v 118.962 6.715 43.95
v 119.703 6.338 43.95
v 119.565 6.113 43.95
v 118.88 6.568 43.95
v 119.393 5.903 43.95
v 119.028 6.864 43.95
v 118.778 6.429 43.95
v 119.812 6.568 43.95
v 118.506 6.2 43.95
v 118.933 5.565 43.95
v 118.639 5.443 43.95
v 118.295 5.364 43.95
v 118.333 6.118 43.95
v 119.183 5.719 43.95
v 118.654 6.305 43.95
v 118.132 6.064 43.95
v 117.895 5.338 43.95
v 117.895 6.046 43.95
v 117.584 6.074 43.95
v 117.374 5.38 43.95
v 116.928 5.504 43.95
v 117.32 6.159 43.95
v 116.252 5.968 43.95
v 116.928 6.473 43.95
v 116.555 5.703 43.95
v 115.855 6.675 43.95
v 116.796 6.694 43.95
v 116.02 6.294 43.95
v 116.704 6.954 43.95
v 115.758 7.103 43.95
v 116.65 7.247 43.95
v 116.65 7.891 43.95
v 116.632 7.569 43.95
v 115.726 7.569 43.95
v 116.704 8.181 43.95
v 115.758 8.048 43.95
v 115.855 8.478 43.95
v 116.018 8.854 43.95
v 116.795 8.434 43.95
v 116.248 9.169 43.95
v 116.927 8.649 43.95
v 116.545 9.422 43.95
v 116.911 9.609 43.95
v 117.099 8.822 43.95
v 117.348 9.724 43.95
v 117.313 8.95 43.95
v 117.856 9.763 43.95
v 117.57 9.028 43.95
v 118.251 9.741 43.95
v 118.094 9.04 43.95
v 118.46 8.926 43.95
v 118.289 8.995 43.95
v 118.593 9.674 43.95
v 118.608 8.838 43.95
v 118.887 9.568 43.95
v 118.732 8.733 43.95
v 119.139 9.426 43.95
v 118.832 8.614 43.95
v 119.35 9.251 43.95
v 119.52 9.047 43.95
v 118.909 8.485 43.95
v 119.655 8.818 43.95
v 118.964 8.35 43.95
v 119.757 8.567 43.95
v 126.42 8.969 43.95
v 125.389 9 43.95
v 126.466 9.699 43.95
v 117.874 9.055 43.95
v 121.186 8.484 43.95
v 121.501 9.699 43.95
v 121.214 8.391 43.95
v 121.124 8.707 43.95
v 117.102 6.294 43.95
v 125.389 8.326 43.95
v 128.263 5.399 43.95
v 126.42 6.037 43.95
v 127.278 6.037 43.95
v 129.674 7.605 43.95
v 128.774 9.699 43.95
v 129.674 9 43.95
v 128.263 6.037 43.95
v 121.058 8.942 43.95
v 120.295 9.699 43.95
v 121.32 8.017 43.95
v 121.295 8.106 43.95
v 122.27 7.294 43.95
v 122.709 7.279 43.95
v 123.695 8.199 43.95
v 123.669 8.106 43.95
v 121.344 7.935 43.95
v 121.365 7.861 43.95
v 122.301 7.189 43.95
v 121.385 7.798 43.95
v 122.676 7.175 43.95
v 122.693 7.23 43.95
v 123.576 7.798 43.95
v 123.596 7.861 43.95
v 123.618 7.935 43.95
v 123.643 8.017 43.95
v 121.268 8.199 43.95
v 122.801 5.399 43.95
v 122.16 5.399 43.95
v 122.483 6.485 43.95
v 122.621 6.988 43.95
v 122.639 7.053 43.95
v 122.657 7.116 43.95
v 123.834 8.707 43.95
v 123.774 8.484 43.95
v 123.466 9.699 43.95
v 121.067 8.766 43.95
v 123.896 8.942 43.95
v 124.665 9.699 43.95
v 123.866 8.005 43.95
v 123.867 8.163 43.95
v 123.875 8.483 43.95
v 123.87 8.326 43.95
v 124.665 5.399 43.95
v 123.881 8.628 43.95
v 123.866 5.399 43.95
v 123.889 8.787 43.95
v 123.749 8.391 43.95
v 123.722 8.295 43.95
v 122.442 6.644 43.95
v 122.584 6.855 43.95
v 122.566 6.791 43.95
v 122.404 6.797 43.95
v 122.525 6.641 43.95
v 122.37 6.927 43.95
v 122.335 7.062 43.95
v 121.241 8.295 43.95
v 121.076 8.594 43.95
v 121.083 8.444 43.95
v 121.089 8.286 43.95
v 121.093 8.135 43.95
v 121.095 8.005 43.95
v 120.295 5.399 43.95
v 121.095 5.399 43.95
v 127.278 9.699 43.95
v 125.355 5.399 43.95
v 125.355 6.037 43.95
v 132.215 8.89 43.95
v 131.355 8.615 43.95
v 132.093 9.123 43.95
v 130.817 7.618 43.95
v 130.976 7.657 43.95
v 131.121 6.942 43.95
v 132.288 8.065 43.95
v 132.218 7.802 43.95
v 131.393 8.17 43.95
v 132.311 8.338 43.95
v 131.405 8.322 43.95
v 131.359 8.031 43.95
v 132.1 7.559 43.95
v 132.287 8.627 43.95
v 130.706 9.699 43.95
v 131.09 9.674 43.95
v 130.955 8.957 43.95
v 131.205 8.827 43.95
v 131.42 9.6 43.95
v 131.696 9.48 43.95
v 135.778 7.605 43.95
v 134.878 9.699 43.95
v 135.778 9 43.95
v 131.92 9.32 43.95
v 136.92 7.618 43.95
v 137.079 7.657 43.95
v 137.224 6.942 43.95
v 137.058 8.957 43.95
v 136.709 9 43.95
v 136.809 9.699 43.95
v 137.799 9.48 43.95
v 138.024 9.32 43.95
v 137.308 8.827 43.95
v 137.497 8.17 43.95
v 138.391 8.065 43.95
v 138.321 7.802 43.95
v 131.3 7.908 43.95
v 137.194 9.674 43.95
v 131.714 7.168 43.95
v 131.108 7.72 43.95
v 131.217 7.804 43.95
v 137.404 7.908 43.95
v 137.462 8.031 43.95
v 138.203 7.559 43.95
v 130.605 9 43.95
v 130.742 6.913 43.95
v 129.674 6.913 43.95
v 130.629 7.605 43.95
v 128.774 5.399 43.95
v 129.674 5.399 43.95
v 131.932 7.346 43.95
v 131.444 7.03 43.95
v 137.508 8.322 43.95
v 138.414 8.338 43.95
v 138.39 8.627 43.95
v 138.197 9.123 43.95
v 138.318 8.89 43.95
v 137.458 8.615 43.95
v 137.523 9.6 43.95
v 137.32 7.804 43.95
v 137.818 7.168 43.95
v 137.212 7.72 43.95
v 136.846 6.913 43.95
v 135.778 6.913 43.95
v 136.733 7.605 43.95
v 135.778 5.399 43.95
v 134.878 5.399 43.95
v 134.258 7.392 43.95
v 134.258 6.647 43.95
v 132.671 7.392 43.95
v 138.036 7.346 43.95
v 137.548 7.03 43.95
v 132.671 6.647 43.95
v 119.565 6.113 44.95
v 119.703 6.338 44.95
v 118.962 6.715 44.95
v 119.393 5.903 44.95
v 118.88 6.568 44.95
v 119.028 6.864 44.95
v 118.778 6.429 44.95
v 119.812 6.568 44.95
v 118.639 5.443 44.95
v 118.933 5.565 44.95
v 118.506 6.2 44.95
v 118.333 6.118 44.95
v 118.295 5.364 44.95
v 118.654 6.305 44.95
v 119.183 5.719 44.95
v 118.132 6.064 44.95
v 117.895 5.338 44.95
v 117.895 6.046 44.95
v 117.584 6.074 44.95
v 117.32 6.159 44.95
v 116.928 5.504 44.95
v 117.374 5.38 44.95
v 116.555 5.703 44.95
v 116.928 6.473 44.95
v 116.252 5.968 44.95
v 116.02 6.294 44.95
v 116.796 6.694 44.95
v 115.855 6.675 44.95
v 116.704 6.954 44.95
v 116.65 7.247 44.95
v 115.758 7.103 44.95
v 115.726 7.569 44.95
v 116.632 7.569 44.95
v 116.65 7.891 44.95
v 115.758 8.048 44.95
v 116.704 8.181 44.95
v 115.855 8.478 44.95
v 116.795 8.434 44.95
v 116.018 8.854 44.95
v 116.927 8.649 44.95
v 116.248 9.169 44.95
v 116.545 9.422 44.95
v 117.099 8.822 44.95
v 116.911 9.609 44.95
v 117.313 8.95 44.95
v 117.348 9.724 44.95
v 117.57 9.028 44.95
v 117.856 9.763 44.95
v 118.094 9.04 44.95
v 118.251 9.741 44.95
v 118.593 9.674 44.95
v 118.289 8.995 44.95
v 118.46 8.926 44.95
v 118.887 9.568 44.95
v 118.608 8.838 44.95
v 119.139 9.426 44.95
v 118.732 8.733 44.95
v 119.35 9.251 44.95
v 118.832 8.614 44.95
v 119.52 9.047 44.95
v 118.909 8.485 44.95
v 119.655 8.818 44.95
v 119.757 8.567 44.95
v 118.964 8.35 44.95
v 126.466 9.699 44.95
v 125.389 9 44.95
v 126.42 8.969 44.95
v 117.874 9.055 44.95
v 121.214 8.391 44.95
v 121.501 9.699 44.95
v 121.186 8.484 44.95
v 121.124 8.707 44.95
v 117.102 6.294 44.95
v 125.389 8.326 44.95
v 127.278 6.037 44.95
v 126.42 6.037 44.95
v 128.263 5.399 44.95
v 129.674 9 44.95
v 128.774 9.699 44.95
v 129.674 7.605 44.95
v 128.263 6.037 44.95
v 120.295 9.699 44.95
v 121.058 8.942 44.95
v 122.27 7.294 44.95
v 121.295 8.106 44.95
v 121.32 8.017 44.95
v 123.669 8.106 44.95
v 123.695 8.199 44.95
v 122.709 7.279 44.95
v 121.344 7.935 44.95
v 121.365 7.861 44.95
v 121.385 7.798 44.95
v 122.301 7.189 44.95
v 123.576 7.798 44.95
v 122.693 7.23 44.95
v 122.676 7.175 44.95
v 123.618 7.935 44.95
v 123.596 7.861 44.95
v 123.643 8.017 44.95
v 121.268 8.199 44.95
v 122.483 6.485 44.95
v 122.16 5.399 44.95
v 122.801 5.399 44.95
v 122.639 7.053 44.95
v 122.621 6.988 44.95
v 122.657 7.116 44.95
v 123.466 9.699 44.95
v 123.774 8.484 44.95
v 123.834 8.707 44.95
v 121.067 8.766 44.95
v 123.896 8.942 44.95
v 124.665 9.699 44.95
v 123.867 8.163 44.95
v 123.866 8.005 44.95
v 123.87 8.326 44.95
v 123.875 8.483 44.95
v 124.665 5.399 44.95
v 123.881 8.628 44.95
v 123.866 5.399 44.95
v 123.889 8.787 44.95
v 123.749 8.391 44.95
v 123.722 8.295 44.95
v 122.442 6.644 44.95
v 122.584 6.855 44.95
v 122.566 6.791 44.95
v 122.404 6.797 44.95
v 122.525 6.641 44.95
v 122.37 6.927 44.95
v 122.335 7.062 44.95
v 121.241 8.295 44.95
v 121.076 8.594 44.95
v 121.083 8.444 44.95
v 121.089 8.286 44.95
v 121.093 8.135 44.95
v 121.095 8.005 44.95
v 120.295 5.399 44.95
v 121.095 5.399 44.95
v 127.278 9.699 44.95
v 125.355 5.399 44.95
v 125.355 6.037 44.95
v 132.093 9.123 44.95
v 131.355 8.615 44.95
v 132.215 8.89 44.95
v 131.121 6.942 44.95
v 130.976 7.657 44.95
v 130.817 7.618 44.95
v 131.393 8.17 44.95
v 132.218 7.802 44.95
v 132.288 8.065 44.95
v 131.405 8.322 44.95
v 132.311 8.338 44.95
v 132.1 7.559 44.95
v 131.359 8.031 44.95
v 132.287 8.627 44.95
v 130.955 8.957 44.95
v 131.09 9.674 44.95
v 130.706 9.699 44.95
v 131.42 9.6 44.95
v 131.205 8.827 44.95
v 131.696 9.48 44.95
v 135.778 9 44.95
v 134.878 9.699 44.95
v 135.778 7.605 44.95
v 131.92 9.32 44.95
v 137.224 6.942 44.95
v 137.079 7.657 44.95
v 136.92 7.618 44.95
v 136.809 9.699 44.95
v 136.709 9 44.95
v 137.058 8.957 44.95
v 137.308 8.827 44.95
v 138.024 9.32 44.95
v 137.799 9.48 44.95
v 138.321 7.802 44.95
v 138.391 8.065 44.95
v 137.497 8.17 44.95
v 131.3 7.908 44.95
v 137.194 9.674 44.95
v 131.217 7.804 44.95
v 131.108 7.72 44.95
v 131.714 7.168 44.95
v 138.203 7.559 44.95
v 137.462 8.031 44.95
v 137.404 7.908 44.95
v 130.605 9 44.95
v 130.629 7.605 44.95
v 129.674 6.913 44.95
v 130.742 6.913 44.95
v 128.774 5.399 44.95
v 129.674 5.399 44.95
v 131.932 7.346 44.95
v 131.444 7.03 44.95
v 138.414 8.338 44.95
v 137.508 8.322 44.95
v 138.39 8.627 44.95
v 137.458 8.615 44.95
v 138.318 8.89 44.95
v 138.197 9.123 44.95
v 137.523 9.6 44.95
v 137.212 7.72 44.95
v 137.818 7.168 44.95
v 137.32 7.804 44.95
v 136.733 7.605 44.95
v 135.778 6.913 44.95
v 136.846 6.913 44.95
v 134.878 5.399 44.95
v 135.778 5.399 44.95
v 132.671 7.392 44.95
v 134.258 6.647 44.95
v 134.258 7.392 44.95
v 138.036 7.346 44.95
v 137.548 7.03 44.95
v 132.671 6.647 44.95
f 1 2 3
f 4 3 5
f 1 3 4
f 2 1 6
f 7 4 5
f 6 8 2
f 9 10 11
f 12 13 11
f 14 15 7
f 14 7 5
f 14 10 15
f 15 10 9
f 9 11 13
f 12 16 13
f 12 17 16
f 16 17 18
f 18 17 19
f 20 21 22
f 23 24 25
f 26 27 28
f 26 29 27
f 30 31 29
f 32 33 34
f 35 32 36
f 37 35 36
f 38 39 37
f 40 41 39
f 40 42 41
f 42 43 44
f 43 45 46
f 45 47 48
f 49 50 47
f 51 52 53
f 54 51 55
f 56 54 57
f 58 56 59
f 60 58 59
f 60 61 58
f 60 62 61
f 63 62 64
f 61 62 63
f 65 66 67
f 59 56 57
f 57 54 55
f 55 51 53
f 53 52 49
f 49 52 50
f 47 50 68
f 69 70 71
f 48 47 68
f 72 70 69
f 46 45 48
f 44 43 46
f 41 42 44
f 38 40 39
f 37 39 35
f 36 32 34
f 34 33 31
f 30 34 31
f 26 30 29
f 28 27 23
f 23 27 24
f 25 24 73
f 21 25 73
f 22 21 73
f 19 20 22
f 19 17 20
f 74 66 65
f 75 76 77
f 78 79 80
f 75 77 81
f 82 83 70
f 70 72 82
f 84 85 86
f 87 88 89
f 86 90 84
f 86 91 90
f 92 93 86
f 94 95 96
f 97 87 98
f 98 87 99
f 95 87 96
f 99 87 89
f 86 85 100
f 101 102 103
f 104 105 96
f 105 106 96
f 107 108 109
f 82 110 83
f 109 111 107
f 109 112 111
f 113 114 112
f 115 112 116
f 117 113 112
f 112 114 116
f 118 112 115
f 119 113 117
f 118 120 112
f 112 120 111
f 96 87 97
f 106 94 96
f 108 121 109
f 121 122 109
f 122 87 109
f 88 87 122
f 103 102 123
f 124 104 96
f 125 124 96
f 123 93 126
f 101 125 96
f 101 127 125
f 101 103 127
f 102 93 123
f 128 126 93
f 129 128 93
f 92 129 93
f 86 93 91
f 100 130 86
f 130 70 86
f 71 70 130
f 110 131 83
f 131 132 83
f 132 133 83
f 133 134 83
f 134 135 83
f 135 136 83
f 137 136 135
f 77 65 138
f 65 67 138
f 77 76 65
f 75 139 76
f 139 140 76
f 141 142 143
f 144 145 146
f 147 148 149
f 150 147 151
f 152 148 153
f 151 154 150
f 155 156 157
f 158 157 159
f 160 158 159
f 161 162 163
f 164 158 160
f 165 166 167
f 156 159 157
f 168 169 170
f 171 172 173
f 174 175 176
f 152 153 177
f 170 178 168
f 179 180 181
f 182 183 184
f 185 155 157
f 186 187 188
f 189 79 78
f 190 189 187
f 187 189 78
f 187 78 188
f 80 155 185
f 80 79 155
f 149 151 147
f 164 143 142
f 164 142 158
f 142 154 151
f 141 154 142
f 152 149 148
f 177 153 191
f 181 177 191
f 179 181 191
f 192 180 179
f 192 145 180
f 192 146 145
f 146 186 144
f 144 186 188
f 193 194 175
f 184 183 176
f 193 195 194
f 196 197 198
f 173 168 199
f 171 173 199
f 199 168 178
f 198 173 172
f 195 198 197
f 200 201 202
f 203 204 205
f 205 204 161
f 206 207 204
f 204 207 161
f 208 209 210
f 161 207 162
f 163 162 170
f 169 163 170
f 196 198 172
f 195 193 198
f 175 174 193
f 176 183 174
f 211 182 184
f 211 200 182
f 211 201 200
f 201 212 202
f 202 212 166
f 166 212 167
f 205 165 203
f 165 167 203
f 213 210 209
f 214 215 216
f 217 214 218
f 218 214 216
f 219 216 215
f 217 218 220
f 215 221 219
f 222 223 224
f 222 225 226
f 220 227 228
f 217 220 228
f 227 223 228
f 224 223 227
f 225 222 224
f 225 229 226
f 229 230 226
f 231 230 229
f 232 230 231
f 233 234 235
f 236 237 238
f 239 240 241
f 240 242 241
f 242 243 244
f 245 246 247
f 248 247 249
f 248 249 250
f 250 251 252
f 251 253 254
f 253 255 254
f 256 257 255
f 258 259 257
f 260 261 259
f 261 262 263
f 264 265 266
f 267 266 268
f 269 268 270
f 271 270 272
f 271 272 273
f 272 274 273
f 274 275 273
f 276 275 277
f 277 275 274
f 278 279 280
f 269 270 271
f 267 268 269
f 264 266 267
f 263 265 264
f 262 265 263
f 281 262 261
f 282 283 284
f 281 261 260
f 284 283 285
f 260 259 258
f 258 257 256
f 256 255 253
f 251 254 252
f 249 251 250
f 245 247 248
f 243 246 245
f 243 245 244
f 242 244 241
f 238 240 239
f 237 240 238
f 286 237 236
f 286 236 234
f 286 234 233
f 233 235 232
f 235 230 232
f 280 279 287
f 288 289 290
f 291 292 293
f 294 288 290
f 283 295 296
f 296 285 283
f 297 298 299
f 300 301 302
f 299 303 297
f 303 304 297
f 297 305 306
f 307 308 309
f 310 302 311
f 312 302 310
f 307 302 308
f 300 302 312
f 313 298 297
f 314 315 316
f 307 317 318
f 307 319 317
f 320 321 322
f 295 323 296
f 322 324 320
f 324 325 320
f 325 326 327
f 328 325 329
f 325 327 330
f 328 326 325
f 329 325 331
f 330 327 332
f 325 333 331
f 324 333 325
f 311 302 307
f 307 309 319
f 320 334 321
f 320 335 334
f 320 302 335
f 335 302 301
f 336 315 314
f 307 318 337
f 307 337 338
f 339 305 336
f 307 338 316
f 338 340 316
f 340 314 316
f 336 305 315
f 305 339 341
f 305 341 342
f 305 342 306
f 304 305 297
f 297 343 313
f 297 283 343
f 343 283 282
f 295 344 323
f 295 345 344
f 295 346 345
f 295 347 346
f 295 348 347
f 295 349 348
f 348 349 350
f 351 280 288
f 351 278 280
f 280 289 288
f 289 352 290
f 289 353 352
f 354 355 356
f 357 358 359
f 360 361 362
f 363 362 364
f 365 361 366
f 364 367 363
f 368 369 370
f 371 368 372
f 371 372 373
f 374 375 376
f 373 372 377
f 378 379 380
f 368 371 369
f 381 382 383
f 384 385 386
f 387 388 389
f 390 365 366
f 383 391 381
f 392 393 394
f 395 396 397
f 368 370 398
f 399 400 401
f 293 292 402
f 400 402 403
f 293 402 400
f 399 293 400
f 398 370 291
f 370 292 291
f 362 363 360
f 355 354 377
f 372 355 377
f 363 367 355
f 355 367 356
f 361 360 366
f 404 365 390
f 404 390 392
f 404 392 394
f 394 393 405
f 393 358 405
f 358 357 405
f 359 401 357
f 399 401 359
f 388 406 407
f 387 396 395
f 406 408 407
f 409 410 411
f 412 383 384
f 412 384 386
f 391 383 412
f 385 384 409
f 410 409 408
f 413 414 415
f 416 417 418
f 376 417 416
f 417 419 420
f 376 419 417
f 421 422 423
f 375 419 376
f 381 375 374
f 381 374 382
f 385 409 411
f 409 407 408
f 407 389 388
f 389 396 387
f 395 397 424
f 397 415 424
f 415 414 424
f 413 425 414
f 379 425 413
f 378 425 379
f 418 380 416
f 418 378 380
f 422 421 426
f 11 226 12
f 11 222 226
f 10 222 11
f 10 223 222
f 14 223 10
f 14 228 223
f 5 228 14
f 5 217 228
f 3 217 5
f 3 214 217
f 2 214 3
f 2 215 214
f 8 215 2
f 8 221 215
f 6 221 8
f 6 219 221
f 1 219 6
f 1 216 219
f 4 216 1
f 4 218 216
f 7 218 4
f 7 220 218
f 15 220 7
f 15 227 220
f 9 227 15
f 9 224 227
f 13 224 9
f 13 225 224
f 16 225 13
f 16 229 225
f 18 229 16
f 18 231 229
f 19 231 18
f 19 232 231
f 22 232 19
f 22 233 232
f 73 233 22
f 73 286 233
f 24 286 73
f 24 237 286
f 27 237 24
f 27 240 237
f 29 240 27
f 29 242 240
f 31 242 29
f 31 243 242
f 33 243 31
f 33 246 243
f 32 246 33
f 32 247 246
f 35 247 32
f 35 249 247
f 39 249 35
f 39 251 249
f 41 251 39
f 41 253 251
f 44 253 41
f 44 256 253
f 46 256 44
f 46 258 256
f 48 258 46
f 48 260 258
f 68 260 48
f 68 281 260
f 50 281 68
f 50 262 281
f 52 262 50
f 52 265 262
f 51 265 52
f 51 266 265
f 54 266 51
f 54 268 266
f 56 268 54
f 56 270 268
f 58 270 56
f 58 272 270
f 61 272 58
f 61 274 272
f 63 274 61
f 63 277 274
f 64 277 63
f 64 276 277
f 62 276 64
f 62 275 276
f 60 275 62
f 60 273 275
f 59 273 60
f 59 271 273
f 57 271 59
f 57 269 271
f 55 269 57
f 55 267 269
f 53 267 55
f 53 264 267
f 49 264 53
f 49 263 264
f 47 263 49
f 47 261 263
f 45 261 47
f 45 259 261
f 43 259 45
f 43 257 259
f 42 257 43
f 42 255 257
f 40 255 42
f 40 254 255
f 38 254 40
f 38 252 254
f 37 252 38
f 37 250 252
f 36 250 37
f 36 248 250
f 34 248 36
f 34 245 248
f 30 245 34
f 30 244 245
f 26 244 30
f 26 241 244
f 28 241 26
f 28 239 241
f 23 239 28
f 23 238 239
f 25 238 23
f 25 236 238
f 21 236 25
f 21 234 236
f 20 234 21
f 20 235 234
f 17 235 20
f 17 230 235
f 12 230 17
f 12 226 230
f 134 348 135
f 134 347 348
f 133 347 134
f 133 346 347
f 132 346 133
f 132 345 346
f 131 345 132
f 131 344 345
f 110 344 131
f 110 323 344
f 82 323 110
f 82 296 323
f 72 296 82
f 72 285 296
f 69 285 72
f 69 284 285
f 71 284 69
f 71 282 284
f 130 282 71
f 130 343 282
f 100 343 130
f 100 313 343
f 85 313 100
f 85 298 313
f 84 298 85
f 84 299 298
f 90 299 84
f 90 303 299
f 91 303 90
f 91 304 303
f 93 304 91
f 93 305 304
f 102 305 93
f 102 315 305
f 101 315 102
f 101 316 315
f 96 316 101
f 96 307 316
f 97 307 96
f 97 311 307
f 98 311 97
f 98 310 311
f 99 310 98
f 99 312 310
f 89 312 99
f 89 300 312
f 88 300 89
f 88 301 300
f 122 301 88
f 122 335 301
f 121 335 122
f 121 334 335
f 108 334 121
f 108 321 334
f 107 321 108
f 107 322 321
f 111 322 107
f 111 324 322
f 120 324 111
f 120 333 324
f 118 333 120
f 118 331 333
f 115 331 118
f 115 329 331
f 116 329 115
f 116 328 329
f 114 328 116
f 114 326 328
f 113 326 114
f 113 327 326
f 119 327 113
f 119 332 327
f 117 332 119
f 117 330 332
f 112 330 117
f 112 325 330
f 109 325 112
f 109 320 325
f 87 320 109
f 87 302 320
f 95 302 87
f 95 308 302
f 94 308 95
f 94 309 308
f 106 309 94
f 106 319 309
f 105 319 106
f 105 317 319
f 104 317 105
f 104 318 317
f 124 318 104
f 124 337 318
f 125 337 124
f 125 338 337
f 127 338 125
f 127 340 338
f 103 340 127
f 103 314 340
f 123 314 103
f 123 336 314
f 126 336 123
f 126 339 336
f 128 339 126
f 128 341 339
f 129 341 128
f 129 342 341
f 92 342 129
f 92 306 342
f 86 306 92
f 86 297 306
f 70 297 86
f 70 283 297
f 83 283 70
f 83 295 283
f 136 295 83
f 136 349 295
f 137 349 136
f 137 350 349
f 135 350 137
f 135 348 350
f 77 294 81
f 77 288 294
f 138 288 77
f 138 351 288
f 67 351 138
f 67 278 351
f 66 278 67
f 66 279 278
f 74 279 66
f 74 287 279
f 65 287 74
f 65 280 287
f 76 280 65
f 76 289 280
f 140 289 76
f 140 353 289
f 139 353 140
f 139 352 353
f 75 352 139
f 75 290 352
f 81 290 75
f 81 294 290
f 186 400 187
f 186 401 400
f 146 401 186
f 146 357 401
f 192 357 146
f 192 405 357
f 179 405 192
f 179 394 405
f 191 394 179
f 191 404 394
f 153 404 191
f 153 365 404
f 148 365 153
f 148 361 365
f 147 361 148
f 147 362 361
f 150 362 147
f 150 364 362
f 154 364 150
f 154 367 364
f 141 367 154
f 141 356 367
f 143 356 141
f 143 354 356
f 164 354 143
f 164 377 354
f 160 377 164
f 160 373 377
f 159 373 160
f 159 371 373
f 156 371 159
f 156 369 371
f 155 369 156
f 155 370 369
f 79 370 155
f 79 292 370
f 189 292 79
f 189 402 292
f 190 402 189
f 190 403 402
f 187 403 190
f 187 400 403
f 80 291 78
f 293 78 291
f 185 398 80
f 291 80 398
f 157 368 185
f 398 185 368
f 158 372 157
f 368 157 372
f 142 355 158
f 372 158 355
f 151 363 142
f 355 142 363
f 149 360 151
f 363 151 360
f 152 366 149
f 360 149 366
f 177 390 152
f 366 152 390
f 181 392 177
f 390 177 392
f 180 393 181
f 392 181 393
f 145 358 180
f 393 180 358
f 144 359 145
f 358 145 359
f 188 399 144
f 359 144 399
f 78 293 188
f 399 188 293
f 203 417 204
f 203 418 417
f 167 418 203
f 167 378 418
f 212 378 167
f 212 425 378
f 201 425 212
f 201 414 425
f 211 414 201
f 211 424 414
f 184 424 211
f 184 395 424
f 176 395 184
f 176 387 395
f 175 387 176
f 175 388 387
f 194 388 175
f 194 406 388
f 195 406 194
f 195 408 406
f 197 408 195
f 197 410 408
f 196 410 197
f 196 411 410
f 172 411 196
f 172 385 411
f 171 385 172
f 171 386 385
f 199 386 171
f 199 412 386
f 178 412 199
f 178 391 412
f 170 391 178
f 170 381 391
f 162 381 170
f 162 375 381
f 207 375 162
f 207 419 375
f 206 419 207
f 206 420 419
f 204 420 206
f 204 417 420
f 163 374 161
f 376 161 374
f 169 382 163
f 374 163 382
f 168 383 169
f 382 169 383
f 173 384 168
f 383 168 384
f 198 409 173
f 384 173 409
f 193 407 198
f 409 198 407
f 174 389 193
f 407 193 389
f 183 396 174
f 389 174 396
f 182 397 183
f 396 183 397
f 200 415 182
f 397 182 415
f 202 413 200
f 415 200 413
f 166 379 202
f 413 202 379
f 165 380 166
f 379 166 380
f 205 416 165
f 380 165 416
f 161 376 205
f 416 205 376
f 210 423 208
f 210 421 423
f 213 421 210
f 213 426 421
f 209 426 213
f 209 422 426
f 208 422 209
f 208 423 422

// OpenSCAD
// CM1P-P ID text, engraved 0.5 into the plate's top face (frame as cm1p_k_freecad.py).
translate([127, 7.5, 43.95]) linear_extrude(1) text("CM1P-P", size = 4.5, font = "Liberation Sans:style=Bold", halign = "center", valign = "center");
